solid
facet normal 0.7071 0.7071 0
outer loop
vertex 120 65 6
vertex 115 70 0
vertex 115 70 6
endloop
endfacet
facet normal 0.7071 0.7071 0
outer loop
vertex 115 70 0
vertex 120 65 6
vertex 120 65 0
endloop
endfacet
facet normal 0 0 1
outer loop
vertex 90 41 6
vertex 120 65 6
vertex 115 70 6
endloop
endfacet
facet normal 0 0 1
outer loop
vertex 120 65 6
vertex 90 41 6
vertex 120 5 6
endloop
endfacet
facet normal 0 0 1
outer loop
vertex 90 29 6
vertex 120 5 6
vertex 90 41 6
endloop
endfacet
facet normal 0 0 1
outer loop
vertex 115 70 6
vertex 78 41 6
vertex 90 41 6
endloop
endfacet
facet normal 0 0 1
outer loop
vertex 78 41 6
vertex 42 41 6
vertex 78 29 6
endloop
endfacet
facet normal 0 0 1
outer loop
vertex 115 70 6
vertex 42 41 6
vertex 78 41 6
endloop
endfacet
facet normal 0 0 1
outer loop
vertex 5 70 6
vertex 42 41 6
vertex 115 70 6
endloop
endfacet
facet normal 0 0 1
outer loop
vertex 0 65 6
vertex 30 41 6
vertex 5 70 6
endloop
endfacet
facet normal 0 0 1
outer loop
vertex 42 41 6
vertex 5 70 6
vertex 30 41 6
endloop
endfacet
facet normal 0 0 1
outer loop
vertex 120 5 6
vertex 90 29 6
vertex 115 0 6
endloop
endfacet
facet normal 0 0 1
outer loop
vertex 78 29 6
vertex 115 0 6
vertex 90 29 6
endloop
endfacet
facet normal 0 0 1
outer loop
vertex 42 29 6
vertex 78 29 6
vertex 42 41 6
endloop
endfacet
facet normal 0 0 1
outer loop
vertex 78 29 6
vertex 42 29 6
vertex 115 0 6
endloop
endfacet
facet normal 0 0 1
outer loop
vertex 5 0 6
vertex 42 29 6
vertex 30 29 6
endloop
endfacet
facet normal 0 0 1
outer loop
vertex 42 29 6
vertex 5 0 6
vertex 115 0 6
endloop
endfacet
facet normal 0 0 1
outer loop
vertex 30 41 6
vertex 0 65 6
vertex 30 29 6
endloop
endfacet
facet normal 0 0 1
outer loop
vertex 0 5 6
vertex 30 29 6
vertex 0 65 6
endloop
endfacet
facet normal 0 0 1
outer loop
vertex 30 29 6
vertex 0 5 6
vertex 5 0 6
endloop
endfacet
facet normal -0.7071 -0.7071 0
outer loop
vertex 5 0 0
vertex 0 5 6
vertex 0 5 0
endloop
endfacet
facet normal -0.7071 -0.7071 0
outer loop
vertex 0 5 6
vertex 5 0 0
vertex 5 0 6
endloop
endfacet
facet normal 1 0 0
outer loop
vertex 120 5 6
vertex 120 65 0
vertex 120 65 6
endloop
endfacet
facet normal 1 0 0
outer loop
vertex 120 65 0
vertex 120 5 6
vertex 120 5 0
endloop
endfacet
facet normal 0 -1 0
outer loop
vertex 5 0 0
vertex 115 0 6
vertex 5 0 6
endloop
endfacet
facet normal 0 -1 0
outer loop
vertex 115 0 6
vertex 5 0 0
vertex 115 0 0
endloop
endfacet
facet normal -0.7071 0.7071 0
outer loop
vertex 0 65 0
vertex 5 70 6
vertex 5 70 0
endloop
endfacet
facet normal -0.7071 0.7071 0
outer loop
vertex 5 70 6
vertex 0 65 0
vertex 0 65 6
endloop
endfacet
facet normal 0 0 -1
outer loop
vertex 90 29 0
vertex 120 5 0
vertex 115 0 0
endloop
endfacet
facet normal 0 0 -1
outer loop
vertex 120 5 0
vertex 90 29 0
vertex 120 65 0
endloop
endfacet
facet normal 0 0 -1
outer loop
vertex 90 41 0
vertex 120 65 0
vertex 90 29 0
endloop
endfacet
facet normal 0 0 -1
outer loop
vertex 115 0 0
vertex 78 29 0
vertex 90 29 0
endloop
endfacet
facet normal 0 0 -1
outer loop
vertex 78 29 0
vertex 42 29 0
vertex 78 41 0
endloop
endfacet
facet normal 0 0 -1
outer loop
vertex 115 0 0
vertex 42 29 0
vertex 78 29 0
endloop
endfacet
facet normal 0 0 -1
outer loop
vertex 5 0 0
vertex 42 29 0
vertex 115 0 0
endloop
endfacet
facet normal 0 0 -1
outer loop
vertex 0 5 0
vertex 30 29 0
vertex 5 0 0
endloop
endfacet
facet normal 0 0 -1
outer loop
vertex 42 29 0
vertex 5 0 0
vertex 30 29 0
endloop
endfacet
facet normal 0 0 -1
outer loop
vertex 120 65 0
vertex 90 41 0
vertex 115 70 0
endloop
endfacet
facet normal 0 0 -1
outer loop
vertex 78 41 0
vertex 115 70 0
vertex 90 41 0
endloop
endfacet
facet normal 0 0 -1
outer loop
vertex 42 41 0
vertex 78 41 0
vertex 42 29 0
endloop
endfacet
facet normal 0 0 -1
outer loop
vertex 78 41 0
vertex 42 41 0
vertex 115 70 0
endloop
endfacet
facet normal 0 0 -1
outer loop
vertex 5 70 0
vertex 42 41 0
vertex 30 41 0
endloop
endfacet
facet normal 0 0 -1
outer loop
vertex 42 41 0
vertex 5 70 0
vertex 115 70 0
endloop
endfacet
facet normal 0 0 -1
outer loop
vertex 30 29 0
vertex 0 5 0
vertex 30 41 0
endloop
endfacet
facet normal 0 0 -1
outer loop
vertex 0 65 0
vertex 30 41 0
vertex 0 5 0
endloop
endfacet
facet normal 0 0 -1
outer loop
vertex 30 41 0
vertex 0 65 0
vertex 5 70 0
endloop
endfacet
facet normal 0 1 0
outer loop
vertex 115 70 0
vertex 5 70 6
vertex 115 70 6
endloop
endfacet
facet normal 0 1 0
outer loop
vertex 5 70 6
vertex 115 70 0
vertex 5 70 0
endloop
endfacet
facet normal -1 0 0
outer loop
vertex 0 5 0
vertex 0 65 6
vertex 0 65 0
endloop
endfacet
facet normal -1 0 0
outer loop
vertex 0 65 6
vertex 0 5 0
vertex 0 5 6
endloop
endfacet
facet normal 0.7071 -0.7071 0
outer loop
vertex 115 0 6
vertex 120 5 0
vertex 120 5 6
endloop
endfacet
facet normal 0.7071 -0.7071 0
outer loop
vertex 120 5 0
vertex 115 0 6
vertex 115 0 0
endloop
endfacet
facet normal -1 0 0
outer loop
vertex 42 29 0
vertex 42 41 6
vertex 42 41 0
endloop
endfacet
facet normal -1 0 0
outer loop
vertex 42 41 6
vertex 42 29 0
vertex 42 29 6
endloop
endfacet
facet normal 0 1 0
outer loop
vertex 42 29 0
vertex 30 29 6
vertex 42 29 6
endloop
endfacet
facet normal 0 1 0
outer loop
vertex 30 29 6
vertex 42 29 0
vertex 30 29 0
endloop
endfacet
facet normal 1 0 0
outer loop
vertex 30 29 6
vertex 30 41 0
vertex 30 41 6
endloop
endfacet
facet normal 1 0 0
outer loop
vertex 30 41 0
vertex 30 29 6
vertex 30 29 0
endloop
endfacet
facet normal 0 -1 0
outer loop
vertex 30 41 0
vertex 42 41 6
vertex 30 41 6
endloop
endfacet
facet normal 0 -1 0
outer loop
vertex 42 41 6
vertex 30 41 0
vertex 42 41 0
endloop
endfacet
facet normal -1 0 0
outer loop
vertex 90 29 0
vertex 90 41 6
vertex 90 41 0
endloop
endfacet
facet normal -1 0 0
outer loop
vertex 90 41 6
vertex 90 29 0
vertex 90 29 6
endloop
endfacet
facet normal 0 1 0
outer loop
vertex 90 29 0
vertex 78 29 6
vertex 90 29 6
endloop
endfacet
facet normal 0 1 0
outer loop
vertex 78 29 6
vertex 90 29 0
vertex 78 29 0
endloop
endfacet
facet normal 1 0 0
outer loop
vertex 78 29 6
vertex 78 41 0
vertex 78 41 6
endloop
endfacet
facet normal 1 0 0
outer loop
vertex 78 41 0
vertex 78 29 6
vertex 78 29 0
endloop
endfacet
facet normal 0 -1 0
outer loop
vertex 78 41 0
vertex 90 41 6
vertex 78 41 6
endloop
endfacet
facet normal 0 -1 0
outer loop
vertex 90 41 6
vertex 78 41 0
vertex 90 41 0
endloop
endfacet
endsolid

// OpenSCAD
$fn = 32;

// ----------------------------------------------------------------------
// Windowed plate: 2 voids, 120 x 70 x 6 mm
// ----------------------------------------------------------------------

// --- parameters (mm) ---
plate_l = 120;            // plate length, X
plate_w = 70;             // plate width, Y
plate_t = 6;              // plate thickness, Z
edge_margin = 12;         // wall from the plate edge to any window
windows = 2;              // number of windows in the row
win_l = 12;               // window length
win_w = 12;               // window width
win_pitch = 48;           // window pitch along X
depth_1 = 6;              // depth of void 1 (full thickness = through)
depth_2 = 6;              // depth of void 2 (full thickness = through)
corner_c = 5;             // corner chamfer of the plate

profile = [[5, 0], [115, 0], [120, 5], [120, 65], [115, 70], [5, 70], [0, 65], [0, 5]];  // primary outline, 8 points, counter clockwise
void_1 = [[30, 29], [42, 29], [42, 41], [30, 41]];  // window 1 of the row, 4 points
void_2 = [[78, 29], [90, 29], [90, 41], [78, 41]];  // window 2 of the row, 4 points

// --- the one profile operation ---
difference() {
  linear_extrude(height = plate_t) polygon(points = profile);
  translate([0, 0, -1])
    linear_extrude(height = plate_t + 2) polygon(points = void_1);
  translate([0, 0, -1])
    linear_extrude(height = plate_t + 2) polygon(points = void_2);
}
